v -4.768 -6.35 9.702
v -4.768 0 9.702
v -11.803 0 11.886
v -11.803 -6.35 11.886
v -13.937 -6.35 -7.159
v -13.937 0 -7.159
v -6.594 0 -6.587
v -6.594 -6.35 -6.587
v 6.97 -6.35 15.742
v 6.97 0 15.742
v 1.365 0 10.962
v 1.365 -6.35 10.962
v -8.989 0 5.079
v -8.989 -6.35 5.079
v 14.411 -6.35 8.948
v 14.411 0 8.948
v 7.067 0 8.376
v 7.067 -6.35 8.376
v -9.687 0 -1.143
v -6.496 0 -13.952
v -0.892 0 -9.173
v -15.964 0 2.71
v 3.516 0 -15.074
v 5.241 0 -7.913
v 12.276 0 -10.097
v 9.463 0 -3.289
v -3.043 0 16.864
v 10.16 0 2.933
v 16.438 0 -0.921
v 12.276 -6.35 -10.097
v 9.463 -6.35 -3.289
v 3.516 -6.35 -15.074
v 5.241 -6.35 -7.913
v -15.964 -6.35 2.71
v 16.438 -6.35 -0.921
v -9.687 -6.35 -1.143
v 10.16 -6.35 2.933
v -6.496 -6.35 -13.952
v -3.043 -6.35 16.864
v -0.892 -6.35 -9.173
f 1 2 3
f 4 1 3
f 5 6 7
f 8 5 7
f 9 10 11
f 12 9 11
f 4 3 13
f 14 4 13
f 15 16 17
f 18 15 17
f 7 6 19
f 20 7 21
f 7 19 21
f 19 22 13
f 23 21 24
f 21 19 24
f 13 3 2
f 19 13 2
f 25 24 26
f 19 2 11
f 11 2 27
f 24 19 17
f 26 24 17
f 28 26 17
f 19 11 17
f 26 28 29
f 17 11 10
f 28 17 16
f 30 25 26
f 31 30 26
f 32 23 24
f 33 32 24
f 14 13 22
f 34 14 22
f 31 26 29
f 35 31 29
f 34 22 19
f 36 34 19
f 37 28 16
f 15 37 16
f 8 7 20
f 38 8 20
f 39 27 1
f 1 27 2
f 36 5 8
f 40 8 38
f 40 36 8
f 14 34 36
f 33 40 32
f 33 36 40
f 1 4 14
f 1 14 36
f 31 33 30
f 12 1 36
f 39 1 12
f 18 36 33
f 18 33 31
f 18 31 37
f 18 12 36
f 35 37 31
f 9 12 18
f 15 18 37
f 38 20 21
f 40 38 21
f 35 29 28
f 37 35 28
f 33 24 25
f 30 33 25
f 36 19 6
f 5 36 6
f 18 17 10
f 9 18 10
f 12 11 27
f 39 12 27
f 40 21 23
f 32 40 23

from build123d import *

# Parameters (mm, degrees)
F1_DEPTH = 6.35


with BuildPart() as f1:
    # F0 (on Front) → F1 (new body)
    with BuildSketch(Plane.XZ):
        Polygon((-13.9372432471, -7.1591061907), (-6.593507121, -6.5868337818), (-9.6865712375, -1.1433150152), align=None)
        Polygon((-9.6865712375, -1.1433150152), (-6.593507121, -6.5868337818), (-0.8915456345, -9.172675501), (5.2413577367, -7.9131365257), (9.4626423545, -3.2893179343), (10.1599209711, 2.9326387291), (7.0668568545, 8.3761574957), (1.364895368, 10.9619992149), (-4.7680080032, 9.7024602396), (-8.989292621, 5.0786416482), align=None)
        Polygon((-0.8915456345, -9.172675501), (-6.593507121, -6.5868337818), (-6.4963796804, -13.9521933969), align=None)
        Polygon((-15.9641518481, 2.7102466722), (-9.6865712375, -1.1433150152), (-8.989292621, 5.0786416482), align=None)
        Polygon((5.2413577367, -7.9131365257), (-0.8915456345, -9.172675501), (3.5162818752, -15.0742865222), align=None)
        Polygon((-11.8028952898, 11.8861078451), (-8.989292621, 5.0786416482), (-4.7680080032, 9.7024602396), align=None)
        Polygon((9.4626423545, -3.2893179343), (5.2413577367, -7.9131365257), (12.2762450233, -10.0967841312), align=None)
        Polygon((-3.0429321417, 16.8636102361), (-4.7680080032, 9.7024602396), (1.364895368, 10.9619992149), align=None)
        Polygon((10.1599209711, 2.9326387291), (9.4626423545, -3.2893179343), (16.4375015816, -0.9209229583), align=None)
        Polygon((6.9697294139, 15.7415171108), (1.364895368, 10.9619992149), (7.0668568545, 8.3761574957), align=None)
        Polygon((7.0668568545, 8.3761574957), (10.1599209711, 2.9326387291), (14.4105929806, 8.9484299046), align=None)
    extrude(amount=F1_DEPTH)


solid = f1.part
